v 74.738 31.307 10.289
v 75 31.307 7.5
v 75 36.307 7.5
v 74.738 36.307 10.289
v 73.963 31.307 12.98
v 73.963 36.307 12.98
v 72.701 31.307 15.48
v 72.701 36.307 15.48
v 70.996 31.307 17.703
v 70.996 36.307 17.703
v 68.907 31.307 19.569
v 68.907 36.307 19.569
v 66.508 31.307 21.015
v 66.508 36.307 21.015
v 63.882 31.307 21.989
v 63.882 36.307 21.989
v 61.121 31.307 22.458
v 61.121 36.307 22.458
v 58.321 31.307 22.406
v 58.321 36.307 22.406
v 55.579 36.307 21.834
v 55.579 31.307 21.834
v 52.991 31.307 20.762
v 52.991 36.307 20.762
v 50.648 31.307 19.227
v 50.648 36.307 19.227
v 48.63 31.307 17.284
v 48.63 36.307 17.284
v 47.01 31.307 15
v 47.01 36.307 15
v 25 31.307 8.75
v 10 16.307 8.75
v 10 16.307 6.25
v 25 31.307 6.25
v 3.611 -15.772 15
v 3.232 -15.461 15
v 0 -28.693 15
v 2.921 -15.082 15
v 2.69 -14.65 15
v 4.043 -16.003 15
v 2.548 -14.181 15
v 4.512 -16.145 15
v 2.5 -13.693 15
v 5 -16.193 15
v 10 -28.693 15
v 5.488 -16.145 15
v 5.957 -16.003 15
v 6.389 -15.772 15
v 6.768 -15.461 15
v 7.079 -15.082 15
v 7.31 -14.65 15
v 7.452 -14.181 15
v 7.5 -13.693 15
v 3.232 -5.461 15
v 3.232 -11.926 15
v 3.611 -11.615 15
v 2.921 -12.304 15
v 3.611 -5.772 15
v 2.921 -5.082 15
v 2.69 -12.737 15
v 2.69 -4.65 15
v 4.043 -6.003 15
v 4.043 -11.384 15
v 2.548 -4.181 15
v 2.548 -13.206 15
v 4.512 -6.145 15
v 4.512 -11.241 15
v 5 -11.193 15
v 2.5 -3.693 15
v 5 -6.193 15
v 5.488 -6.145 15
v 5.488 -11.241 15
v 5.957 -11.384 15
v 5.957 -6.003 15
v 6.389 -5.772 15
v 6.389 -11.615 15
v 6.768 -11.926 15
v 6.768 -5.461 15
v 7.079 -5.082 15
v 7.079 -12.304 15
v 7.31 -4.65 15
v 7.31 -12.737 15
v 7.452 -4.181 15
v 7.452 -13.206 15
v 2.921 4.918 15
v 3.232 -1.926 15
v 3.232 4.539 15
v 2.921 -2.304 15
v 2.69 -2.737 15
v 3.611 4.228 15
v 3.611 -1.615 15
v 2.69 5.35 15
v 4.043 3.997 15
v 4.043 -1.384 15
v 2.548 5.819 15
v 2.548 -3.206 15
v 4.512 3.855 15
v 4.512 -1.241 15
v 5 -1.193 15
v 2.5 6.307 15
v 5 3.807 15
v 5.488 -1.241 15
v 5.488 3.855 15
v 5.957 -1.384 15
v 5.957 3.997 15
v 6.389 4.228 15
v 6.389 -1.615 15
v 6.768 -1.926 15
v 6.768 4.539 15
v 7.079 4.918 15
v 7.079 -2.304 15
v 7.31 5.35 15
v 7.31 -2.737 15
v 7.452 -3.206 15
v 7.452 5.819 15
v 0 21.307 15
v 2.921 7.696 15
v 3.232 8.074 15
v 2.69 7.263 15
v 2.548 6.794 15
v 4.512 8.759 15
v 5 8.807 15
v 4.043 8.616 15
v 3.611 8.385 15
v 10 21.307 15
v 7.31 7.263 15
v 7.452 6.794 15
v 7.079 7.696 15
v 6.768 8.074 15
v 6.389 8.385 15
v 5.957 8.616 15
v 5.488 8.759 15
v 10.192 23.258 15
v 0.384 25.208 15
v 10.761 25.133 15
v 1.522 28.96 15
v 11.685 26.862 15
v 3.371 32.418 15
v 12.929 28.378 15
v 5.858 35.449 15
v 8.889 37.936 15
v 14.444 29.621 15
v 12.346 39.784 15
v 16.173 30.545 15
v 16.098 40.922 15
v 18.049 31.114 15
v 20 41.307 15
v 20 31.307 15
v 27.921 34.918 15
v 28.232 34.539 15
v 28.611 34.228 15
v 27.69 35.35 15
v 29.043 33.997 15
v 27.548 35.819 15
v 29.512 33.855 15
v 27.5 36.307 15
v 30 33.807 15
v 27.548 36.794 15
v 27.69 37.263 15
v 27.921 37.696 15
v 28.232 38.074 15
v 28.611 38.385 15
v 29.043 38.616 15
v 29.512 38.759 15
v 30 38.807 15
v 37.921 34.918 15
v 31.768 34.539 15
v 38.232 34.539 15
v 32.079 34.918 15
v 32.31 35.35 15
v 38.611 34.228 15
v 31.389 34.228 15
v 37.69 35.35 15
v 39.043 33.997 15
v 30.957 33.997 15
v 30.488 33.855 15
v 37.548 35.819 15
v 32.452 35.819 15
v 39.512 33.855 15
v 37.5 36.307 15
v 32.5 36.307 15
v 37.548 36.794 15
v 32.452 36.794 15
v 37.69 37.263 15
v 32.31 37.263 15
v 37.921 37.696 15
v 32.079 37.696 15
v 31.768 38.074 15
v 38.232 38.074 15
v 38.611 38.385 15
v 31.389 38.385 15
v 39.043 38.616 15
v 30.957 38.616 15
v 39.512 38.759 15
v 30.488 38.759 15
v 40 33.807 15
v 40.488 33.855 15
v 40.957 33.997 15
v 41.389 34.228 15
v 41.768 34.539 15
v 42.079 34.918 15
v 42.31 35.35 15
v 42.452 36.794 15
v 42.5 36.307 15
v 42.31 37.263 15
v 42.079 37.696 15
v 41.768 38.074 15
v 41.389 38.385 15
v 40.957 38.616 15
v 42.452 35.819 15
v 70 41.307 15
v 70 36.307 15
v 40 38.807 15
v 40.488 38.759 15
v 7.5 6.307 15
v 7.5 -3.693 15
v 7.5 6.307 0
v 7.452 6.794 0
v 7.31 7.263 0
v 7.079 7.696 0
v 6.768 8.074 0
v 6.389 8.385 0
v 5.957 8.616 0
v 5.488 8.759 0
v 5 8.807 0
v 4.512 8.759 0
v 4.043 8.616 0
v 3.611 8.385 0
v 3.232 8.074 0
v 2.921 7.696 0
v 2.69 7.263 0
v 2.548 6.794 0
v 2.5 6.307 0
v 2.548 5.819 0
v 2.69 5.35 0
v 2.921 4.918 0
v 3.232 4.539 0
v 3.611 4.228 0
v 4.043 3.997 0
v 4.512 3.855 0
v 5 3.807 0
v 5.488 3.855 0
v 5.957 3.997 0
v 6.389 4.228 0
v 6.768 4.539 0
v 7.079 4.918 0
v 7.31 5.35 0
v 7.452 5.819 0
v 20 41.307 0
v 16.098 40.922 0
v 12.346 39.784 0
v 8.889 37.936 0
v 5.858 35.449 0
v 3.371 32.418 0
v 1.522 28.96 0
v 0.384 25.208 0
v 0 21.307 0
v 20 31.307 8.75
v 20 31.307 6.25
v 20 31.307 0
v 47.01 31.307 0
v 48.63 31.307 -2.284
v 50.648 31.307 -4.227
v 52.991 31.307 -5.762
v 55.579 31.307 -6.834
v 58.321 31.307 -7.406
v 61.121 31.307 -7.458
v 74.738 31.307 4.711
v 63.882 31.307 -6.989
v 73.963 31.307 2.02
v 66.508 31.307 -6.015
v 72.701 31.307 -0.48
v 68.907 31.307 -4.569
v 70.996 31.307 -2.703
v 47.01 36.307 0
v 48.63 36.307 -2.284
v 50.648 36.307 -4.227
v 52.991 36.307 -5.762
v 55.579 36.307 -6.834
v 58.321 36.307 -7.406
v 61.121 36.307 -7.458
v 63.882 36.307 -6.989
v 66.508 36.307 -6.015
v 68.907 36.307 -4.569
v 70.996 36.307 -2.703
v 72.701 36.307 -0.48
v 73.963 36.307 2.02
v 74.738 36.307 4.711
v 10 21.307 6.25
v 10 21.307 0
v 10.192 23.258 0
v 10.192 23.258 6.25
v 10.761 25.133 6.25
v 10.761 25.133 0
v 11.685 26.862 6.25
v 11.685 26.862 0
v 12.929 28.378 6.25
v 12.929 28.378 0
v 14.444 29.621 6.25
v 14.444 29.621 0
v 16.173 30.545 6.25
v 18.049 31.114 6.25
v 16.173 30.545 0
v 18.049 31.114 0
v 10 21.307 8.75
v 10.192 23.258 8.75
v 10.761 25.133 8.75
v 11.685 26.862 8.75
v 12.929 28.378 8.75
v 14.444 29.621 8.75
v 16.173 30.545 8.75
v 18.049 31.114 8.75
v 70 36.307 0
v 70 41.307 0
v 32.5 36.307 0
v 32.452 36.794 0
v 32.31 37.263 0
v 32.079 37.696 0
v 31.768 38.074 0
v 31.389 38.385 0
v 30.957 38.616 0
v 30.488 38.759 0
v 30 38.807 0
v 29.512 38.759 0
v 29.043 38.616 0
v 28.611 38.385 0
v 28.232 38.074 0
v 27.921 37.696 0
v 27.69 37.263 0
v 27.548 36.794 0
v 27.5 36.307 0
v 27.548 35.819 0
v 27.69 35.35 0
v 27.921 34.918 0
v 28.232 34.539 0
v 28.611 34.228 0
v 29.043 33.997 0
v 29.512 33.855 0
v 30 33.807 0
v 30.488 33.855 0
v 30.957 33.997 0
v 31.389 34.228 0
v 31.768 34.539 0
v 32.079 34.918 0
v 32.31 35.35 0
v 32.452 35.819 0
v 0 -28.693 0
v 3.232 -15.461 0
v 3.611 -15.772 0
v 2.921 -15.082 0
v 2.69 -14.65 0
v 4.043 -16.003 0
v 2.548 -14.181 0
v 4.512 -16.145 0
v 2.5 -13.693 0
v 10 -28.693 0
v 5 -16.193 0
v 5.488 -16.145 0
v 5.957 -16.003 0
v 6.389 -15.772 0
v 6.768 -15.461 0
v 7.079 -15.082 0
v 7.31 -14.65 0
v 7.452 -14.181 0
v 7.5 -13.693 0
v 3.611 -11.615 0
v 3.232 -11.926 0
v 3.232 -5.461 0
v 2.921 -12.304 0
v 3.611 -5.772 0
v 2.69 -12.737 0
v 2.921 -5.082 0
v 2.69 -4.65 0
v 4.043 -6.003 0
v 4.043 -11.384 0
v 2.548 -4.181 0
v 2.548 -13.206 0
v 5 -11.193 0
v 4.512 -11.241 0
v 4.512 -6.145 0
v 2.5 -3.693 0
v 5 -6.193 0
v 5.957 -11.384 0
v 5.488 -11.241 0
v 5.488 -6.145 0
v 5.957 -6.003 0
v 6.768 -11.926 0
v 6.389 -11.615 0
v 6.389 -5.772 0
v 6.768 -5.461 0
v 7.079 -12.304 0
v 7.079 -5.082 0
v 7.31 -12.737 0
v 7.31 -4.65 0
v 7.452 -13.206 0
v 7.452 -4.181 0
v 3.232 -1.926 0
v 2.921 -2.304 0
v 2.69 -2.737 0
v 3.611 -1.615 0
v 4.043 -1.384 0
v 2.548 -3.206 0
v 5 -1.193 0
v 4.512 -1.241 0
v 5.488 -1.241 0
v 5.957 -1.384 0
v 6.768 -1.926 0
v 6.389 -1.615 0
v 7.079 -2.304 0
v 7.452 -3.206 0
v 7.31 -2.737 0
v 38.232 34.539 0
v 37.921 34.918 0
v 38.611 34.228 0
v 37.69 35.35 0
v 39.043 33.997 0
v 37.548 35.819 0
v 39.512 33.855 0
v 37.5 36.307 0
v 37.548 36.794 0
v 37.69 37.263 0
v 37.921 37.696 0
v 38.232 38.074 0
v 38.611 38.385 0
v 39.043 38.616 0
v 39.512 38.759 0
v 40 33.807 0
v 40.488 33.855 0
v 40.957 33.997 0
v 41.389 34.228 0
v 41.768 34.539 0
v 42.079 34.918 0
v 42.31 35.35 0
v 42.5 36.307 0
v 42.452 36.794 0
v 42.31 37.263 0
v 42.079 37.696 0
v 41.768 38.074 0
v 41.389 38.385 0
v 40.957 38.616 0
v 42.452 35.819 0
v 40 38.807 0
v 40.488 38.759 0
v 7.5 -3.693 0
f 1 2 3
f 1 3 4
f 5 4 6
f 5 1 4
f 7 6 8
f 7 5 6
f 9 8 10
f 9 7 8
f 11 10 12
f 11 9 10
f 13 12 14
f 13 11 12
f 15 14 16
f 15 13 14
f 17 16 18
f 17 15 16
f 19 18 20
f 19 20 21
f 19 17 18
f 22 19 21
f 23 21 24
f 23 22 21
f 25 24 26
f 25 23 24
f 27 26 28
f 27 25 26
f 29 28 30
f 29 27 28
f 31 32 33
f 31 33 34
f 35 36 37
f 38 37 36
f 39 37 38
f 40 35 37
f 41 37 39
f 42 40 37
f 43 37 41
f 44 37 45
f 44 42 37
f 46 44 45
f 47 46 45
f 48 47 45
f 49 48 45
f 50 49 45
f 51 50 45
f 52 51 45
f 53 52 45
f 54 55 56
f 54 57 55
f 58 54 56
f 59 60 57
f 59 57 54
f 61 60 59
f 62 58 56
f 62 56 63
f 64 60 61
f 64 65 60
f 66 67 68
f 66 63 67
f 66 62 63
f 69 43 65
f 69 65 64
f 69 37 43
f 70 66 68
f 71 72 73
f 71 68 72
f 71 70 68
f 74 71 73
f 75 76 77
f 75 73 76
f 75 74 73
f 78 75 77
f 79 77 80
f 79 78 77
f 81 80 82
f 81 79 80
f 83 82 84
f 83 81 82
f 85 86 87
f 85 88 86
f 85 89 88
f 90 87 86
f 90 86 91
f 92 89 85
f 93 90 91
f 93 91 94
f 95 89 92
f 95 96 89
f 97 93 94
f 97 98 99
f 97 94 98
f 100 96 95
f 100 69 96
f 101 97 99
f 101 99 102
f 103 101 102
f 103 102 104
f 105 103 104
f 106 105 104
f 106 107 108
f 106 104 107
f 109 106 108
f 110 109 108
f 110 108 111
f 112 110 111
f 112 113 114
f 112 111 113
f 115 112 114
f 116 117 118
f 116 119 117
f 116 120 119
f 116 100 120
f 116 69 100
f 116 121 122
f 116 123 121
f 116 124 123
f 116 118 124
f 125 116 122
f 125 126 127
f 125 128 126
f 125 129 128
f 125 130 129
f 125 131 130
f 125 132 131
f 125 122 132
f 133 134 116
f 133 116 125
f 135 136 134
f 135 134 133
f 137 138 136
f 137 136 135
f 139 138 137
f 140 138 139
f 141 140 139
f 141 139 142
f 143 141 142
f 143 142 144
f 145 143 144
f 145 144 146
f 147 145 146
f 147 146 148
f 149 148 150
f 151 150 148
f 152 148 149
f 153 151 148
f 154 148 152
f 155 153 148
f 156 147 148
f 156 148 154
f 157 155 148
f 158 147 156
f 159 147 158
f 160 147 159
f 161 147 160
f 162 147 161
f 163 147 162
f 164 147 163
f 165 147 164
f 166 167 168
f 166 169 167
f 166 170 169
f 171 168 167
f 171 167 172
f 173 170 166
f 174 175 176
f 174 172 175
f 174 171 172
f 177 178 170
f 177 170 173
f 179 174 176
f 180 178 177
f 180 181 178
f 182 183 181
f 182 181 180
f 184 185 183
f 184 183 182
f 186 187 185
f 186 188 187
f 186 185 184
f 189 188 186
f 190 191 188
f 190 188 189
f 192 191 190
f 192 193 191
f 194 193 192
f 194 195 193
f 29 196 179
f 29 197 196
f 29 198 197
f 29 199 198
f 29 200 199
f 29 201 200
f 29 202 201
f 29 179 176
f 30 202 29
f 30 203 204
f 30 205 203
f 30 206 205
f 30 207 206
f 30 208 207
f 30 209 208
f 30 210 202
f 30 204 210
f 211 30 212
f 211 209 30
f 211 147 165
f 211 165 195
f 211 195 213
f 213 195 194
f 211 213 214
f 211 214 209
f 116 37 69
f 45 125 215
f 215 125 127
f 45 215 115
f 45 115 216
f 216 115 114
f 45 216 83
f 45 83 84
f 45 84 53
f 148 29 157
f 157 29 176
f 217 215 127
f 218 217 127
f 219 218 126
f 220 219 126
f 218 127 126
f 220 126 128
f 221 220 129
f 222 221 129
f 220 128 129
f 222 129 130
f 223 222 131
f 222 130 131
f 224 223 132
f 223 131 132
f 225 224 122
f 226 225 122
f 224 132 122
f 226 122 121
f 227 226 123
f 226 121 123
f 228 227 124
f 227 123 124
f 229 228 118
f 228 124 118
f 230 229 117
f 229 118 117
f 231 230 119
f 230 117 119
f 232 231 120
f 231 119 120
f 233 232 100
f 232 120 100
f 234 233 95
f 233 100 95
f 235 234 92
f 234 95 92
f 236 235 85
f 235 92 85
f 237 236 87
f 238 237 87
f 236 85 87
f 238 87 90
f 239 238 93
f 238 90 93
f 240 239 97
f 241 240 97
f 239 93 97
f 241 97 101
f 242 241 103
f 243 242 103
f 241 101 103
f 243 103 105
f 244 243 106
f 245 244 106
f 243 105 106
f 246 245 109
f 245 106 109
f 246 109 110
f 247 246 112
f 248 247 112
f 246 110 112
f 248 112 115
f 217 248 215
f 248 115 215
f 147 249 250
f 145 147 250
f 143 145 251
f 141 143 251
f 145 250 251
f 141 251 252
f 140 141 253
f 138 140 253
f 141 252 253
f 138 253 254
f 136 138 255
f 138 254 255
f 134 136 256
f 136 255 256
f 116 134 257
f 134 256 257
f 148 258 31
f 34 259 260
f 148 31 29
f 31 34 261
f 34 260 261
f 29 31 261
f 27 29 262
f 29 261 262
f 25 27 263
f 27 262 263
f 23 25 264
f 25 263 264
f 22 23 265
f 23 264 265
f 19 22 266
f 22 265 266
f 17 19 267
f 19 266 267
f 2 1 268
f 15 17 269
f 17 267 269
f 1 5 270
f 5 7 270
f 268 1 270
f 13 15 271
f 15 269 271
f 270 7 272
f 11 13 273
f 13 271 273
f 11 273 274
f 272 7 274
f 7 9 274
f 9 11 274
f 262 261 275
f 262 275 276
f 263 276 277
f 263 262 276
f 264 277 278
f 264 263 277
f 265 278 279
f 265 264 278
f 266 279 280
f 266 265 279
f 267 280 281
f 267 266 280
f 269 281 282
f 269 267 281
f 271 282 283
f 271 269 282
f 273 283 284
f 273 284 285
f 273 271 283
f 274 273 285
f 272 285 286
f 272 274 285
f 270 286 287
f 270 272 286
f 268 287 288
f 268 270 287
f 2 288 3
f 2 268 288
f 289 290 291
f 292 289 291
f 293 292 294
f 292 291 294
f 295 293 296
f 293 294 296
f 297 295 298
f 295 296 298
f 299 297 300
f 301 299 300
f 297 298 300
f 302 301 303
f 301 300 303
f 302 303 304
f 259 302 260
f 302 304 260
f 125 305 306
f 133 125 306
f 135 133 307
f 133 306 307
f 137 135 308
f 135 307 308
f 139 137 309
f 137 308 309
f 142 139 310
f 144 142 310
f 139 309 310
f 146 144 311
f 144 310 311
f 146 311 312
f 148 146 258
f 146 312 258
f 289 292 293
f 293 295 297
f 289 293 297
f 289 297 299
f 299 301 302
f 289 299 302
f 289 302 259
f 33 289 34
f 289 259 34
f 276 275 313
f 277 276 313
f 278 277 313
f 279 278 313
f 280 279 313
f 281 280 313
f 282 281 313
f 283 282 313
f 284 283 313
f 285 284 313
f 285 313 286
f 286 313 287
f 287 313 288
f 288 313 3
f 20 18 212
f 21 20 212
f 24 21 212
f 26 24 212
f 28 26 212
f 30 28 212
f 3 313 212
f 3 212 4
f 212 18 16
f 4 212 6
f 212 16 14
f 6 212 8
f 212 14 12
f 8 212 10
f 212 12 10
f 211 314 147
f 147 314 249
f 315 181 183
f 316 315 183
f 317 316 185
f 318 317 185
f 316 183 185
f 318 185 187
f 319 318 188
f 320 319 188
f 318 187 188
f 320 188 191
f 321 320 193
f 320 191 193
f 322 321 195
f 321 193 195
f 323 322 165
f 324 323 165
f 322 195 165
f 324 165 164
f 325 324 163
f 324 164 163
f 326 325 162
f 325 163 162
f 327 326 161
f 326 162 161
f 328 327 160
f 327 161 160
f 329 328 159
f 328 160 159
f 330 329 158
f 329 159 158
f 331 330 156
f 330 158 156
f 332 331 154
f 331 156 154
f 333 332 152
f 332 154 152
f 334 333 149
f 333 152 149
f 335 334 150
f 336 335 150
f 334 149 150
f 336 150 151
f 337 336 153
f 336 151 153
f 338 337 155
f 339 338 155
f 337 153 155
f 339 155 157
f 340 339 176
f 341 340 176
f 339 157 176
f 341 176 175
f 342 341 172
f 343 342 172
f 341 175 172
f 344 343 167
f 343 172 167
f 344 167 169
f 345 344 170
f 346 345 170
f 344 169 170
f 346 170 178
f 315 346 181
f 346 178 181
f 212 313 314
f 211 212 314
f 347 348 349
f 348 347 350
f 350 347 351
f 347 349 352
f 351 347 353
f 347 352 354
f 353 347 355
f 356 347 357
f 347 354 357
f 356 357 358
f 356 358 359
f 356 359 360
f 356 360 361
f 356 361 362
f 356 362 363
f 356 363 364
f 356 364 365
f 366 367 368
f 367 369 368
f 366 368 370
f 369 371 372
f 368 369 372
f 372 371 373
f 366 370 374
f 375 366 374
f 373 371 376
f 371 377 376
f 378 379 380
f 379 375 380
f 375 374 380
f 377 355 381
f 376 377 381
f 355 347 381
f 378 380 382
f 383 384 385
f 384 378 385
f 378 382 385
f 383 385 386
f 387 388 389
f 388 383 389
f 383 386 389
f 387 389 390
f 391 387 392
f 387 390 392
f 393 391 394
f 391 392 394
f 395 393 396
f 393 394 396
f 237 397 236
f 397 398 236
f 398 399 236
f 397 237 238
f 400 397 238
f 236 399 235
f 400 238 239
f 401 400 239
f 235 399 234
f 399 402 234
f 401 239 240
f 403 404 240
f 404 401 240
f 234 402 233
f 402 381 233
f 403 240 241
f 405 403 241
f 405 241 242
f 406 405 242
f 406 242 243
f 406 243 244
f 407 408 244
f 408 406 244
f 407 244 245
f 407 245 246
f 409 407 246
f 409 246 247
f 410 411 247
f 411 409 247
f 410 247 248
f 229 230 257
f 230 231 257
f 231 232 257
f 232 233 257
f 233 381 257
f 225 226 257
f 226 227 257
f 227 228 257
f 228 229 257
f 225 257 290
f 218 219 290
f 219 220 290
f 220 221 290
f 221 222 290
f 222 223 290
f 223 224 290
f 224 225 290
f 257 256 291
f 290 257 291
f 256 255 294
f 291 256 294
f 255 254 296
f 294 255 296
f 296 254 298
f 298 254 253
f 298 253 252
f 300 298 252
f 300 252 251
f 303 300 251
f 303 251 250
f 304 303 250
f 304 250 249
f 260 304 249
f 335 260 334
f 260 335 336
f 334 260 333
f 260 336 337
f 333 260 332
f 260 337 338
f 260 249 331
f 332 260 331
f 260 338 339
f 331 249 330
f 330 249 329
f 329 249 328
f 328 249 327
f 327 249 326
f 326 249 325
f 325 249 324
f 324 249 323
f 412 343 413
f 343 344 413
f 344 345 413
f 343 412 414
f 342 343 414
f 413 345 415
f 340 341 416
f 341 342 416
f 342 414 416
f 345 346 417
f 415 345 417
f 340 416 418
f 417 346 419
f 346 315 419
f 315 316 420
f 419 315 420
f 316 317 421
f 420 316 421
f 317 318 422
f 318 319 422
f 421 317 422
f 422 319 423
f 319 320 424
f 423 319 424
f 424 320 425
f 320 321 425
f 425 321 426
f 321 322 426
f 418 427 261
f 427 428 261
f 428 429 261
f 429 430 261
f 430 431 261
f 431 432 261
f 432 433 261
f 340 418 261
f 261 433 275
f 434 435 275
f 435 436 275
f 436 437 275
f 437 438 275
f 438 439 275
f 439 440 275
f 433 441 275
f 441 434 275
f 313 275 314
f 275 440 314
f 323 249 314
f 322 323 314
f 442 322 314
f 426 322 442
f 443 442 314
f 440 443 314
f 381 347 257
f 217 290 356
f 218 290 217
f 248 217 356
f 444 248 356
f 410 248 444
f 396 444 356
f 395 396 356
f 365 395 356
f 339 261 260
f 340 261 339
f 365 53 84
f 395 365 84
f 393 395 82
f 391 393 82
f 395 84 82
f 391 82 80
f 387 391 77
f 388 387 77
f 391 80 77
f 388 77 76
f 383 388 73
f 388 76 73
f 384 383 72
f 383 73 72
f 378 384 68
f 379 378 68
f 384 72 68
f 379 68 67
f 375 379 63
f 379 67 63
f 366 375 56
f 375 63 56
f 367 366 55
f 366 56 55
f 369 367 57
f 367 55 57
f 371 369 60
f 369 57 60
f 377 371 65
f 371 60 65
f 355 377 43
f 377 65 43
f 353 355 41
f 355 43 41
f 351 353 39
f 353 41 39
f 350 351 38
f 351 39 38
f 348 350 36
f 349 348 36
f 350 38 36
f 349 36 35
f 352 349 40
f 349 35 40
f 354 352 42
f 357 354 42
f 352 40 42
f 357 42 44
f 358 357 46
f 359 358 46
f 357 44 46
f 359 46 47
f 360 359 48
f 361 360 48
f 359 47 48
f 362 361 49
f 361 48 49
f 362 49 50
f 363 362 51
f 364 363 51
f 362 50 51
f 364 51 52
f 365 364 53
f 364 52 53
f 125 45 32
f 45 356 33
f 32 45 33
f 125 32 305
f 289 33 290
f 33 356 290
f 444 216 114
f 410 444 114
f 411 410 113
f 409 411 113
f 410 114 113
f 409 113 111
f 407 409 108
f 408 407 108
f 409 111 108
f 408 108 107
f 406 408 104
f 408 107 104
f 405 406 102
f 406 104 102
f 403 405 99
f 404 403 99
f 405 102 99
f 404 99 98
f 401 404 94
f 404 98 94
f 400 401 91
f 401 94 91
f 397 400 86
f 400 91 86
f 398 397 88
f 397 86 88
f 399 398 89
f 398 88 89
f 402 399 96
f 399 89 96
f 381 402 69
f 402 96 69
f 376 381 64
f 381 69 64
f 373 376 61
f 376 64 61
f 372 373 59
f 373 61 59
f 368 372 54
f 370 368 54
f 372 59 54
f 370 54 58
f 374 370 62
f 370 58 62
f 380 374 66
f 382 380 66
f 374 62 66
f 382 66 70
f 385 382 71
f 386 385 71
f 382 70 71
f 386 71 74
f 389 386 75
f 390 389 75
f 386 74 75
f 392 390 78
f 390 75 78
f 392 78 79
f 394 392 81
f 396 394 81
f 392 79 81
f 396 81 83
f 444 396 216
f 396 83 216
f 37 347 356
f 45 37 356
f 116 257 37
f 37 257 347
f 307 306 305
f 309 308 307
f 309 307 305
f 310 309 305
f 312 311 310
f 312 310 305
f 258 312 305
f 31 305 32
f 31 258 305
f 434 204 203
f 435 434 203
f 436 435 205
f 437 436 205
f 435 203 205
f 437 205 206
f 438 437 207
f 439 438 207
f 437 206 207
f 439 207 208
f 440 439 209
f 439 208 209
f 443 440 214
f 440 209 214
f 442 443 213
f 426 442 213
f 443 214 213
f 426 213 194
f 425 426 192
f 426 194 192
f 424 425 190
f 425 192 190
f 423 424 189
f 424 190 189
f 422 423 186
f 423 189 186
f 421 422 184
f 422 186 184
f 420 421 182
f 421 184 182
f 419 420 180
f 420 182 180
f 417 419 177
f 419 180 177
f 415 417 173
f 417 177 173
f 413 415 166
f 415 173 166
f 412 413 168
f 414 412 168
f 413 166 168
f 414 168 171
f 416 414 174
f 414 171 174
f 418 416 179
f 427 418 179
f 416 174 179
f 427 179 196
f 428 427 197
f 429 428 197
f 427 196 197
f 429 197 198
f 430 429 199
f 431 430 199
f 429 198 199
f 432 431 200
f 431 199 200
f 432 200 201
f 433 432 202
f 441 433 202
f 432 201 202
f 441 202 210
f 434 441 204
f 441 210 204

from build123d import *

# Parameters (mm, degrees)
F1_DEPTH = 15
F4_DEPTH = 1.25
F5_R     = 2.5
F6_DEPTH = 15
F8_DEPTH = 5


with BuildPart() as f1:
    # F0 (on Top) → F1 (new body)
    with BuildSketch(Plane.XY):
        with BuildLine():
            ThreePointArc((20, 41.3066352695), (5.8578643763, 35.4487708933), (0, 21.3066352695))
            Line((0, 21.3066352695), (0, -28.6933647305))
            Line((0, -28.6933647305), (10, -28.6933647305))
            Line((10, -28.6933647305), (10, 21.3066352695))
            ThreePointArc((10, 21.3066352695), (12.9289321881, 28.3777030814), (20, 31.3066352695))
            Line((20, 31.3066352695), (70, 31.3066352695))
            Line((70, 31.3066352695), (70, 41.3066352695))
            Line((70, 41.3066352695), (20, 41.3066352695))
        make_face()
    extrude(amount=F1_DEPTH)

    # F3 (on offset) → F4 (join, symmetric)
    with BuildSketch(Plane.XY.offset(7.5)):
        Polygon((10, 31.3066352695), (10, 16.3066352695), (25, 31.3066352695), align=None)
    extrude(amount=F4_DEPTH, both=True)

    # F5 (on face) → F6 (cut, through all)
    with BuildSketch(Plane.XY.offset(15)):
        with Locations((5, -13.6933647305)):
            Circle(F5_R)
        with Locations((5, -3.6933647305)):
            Circle(F5_R)
        with Locations((5, 6.3066352695)):
            Circle(F5_R)
        with Locations((30, 36.3066352695)):
            Circle(F5_R)
        with Locations((40, 36.3066352695)):
            Circle(F5_R)
    extrude(amount=-F6_DEPTH, mode=Mode.SUBTRACT)

    # F7 (on face) → F8 (join)
    with BuildSketch(Plane.XZ.offset(-31.3066352695)):
        with BuildLine():
            Line((70, 15), (47.0096189432, 15))
            ThreePointArc((47.0096189432, 15), (45, 7.5), (47.0096189432, 0))
            Line((47.0096189432, 0), (70, 0))
            Line((70, 0), (70, 15))
        make_face()
        with BuildLine():
            ThreePointArc((47.0096189432, 0), (63.8822856765, -6.9888873943), (75, 7.5))
            ThreePointArc((75, 7.5), (63.8822856765, 21.9888873943), (47.0096189432, 15))
            Line((47.0096189432, 15), (70, 15))
            Line((70, 15), (70, 0))
            Line((70, 0), (47.0096189432, 0))
        make_face()
    extrude(amount=-F8_DEPTH)


solid = f1.part
